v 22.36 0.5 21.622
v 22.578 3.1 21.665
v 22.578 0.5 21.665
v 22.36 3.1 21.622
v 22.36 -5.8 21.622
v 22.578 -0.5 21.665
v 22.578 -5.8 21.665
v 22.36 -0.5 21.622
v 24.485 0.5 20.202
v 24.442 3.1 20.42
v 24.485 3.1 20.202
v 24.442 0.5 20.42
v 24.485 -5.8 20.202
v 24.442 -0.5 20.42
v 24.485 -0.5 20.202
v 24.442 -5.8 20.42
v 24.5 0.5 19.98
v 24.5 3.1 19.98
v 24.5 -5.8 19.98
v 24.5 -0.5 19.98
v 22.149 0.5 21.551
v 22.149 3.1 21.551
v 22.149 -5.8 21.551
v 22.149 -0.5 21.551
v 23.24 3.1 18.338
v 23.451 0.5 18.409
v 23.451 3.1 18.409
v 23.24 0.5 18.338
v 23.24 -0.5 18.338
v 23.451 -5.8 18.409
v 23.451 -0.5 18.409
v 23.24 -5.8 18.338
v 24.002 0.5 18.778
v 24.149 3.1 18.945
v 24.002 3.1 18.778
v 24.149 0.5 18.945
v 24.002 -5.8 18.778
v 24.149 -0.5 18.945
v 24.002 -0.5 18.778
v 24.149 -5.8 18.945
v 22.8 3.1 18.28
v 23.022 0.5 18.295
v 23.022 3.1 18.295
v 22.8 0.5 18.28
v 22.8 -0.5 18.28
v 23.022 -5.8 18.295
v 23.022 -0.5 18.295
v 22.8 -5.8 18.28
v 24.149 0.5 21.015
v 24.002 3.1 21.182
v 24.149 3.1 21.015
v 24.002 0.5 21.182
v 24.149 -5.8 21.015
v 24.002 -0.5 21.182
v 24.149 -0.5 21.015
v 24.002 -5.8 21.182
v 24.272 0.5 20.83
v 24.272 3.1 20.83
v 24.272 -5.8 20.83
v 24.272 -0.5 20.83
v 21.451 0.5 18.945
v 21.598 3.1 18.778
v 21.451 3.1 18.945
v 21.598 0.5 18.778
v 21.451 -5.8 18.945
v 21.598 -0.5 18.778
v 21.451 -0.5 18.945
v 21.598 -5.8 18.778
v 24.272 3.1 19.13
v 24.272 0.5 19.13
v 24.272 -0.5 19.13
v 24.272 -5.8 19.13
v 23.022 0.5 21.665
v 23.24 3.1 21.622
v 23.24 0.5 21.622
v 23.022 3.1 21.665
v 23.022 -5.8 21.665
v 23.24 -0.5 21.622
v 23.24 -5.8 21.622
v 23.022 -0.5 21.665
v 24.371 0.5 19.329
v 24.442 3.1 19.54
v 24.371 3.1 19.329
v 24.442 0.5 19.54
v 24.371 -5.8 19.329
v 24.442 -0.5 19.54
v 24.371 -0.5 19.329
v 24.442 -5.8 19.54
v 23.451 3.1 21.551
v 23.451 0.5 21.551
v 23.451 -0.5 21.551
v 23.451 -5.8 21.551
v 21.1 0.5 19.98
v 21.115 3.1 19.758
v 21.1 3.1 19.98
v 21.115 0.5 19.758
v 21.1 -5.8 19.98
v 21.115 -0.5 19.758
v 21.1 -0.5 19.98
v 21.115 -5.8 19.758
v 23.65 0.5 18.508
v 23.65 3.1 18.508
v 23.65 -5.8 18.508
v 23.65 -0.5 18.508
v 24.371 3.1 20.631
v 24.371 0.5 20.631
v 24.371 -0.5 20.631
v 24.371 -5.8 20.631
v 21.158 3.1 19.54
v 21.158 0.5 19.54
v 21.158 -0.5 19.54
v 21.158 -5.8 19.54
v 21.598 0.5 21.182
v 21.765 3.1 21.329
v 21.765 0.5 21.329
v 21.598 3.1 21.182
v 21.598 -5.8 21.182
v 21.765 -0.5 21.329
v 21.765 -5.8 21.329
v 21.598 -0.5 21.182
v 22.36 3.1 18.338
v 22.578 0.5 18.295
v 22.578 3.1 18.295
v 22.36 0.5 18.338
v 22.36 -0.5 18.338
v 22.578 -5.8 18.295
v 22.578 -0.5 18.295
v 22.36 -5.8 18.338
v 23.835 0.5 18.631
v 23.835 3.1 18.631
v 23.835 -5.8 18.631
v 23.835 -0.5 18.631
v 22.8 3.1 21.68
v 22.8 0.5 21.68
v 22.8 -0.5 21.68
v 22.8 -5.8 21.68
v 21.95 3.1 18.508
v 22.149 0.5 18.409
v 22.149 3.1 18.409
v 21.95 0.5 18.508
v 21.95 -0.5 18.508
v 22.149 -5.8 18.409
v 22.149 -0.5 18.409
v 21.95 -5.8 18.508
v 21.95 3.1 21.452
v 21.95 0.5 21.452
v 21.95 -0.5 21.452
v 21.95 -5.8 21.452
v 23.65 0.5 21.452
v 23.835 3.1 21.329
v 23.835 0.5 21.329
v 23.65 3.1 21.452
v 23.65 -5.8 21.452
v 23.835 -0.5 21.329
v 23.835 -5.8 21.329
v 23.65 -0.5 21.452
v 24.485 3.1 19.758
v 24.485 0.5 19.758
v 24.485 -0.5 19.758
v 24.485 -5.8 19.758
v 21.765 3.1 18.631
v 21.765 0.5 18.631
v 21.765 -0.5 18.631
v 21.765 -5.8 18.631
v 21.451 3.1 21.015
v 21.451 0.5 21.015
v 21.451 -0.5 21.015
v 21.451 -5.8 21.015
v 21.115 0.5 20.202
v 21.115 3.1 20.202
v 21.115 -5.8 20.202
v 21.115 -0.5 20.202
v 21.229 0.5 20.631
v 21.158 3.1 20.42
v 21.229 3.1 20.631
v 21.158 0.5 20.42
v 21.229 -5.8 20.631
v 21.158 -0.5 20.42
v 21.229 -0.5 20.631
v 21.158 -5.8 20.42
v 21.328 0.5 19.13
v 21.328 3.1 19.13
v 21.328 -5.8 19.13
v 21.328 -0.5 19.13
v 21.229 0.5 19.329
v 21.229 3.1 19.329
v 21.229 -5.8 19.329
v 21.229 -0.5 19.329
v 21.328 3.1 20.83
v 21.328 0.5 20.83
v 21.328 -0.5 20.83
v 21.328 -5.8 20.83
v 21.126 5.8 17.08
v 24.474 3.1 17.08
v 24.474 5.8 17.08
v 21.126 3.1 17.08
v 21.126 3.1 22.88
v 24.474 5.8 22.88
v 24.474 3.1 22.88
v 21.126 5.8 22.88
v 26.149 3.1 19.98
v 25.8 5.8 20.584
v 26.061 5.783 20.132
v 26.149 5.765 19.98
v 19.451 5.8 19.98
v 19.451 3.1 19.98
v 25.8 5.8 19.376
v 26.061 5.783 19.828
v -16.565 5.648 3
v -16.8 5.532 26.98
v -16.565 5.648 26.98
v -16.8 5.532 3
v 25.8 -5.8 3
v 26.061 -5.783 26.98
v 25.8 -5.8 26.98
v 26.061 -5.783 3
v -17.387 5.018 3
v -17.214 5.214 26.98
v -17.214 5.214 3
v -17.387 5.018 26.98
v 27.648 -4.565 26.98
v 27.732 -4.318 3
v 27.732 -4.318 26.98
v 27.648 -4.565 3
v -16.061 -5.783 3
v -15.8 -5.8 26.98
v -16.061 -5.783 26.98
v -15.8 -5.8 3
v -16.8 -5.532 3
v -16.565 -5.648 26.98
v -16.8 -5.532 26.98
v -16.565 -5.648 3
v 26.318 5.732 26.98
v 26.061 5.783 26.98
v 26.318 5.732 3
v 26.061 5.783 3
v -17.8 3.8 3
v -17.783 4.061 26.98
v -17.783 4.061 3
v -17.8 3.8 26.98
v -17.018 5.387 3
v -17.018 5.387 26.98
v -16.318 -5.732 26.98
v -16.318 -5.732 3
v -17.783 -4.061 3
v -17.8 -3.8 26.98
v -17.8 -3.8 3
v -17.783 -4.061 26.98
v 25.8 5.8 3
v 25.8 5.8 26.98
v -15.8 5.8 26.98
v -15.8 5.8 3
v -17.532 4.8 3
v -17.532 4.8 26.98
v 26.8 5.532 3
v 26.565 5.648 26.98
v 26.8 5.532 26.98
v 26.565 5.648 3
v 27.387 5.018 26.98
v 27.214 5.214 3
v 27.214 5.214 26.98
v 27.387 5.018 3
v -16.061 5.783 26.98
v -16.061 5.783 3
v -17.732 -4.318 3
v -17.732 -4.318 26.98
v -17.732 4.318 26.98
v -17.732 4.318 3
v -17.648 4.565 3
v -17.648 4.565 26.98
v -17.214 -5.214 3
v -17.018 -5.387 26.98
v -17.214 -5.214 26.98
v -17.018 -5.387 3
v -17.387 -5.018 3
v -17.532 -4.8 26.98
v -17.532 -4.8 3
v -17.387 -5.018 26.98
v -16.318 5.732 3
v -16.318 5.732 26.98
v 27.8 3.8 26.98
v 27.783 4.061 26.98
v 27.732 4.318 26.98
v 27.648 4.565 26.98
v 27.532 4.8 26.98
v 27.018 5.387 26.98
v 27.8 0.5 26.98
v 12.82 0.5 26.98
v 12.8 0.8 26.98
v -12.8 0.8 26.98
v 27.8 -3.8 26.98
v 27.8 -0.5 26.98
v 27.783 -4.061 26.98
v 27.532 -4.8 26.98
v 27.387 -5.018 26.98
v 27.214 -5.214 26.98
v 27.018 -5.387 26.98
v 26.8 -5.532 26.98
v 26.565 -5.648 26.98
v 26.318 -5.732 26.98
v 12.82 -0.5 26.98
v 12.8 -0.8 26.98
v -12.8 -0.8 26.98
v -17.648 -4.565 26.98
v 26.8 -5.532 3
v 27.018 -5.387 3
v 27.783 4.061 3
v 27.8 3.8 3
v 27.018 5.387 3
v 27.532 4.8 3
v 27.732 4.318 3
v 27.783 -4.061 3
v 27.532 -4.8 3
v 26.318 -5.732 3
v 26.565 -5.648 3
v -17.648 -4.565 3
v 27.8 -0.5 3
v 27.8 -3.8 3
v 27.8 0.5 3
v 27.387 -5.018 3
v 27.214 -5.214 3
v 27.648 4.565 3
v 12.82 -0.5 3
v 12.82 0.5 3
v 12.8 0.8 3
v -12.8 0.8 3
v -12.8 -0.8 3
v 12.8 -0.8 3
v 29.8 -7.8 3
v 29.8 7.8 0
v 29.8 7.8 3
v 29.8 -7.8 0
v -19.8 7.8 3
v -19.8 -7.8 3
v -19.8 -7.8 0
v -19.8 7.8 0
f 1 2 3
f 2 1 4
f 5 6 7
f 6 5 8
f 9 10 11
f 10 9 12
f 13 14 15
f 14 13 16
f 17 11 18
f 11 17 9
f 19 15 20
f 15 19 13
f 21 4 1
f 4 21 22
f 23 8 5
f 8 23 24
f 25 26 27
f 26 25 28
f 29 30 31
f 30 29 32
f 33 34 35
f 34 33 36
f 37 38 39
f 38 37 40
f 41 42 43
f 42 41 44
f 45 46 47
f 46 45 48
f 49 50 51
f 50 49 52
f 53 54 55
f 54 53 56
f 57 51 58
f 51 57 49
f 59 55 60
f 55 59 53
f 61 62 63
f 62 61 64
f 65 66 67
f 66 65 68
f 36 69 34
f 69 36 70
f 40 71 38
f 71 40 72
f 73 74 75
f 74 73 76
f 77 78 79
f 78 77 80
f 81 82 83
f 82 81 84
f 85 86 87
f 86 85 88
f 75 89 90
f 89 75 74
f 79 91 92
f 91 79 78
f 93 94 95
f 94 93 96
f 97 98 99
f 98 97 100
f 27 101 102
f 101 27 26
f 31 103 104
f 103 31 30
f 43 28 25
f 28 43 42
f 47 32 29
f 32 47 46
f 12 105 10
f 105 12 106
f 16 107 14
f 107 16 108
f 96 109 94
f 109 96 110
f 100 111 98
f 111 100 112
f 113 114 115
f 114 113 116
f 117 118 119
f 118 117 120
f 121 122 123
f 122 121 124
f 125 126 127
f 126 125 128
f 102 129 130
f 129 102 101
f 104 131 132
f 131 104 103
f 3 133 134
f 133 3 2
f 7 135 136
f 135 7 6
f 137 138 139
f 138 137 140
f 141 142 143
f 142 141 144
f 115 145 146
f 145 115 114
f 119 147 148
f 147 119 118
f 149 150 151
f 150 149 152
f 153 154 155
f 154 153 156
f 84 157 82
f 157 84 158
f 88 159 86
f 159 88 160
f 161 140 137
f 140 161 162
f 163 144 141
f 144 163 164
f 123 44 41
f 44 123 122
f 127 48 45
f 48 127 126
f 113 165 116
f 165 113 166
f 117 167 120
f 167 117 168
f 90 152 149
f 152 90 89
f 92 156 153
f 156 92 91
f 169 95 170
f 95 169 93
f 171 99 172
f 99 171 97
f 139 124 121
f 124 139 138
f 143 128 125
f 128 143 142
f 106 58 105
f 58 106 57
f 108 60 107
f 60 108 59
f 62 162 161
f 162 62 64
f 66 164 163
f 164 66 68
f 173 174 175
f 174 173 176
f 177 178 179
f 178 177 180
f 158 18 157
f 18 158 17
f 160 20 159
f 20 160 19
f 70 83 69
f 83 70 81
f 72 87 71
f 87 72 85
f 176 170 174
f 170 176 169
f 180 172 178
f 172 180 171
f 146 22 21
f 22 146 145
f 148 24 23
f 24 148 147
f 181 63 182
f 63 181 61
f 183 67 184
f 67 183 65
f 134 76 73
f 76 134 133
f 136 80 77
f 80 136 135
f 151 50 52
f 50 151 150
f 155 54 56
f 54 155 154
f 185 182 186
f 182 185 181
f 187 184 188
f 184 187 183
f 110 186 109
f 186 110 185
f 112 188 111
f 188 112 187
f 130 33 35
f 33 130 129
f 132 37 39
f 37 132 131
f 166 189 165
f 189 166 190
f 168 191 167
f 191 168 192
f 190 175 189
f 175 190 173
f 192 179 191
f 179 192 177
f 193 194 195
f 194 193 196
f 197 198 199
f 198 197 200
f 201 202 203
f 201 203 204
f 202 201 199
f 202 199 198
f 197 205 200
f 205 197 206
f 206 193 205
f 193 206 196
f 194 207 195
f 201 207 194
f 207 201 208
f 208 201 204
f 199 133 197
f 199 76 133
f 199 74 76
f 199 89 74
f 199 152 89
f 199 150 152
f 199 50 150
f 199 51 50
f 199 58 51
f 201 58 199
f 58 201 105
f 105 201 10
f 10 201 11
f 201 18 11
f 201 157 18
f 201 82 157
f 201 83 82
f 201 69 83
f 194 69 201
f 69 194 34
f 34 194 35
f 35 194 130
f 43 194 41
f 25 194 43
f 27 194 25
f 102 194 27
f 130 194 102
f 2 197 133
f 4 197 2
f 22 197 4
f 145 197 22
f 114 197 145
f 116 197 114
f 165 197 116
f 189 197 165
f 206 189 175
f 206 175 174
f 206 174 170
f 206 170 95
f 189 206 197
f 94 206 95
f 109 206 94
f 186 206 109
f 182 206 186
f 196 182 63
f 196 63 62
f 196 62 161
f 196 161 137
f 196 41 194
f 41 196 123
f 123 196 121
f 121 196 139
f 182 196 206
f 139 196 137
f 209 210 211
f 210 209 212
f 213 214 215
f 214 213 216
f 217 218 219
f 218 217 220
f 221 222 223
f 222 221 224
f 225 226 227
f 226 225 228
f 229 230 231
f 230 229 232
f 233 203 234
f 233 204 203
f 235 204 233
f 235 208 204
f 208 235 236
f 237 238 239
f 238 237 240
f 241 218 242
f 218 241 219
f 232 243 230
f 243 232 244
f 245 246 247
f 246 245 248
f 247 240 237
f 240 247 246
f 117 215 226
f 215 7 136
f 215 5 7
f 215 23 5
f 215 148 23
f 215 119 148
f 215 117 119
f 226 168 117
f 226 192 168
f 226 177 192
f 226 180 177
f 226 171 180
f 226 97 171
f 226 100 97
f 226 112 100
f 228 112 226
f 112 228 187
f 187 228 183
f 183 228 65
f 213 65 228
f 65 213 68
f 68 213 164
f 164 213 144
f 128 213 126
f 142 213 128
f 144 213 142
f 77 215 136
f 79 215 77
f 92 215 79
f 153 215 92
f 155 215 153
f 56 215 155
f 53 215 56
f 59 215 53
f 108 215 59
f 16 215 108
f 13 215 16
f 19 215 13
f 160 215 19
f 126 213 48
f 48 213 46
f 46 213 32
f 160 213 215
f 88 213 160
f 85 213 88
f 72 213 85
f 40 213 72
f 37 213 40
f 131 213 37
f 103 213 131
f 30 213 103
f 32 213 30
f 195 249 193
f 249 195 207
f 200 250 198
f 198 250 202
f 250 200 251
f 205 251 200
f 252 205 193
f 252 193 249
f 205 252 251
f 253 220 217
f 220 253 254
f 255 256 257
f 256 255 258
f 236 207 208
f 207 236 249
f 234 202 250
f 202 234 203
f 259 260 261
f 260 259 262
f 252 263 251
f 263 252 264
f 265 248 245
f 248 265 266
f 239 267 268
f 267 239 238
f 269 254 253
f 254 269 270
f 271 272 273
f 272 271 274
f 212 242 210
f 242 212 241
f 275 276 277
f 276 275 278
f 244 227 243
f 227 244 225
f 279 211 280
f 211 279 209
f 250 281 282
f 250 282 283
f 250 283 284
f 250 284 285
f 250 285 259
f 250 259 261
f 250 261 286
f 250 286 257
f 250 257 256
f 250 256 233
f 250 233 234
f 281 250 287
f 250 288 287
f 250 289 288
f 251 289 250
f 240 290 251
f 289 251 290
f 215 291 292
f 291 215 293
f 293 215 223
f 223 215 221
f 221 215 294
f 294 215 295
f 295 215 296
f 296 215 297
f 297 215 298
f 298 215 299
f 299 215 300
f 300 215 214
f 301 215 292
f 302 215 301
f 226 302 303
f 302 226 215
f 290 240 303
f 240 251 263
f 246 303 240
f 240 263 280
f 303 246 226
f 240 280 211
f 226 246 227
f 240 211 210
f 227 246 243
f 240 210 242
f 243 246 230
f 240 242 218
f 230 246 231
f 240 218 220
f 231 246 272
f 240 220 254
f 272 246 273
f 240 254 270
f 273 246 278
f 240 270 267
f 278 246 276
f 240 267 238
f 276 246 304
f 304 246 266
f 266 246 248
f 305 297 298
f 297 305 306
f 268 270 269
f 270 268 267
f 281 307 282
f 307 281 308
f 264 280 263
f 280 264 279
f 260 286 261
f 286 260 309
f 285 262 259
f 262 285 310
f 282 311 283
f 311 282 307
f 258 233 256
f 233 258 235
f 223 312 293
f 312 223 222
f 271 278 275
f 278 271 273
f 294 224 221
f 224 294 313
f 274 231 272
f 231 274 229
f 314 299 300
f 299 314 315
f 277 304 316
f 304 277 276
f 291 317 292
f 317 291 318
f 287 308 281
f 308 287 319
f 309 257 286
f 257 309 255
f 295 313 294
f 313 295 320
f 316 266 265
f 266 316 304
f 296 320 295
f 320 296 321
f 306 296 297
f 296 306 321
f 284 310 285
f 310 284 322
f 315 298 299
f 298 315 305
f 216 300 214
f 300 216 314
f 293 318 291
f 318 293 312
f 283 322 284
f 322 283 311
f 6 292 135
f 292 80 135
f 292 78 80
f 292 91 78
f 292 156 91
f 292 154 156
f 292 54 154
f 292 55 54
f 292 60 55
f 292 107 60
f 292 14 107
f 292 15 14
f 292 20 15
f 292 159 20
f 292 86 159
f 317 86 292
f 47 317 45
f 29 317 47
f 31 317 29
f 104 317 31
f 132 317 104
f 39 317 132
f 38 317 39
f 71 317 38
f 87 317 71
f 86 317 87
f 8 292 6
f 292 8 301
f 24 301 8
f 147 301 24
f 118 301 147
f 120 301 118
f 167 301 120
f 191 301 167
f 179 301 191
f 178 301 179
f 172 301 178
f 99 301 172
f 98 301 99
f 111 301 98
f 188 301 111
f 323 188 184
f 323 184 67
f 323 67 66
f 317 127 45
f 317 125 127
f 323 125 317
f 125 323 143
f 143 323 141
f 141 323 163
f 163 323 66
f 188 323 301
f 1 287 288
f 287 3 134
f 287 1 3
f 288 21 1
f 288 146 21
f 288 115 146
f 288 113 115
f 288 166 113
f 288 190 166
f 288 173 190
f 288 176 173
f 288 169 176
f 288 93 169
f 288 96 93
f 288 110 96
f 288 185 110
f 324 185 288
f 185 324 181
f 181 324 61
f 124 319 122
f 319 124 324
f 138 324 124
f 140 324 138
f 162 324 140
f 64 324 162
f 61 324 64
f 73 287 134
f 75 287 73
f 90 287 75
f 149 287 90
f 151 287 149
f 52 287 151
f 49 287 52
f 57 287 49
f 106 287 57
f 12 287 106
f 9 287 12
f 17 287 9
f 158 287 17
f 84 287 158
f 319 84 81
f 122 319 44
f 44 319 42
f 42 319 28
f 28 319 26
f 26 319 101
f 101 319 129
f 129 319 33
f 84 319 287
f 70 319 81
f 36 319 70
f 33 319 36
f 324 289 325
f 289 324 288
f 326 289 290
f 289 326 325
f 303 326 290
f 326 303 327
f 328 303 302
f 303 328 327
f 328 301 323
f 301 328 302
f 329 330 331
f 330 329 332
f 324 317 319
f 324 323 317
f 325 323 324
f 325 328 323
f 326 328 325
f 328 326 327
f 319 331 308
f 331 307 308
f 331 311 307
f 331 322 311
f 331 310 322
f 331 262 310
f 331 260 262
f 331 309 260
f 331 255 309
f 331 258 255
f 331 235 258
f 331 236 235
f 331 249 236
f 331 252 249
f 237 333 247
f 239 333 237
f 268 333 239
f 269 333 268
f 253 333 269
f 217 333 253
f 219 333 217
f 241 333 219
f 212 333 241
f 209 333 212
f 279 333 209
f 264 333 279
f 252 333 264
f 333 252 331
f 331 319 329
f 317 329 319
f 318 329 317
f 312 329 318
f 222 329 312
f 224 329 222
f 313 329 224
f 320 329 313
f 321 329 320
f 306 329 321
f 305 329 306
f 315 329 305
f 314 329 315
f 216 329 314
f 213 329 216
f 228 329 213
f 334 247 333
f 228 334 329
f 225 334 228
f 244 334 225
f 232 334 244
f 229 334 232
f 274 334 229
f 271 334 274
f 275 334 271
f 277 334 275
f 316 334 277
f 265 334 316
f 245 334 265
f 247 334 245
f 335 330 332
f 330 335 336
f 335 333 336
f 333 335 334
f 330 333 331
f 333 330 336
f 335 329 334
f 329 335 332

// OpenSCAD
include <control-throw-ruler-holder.scad>
part = "socket_coupon";
